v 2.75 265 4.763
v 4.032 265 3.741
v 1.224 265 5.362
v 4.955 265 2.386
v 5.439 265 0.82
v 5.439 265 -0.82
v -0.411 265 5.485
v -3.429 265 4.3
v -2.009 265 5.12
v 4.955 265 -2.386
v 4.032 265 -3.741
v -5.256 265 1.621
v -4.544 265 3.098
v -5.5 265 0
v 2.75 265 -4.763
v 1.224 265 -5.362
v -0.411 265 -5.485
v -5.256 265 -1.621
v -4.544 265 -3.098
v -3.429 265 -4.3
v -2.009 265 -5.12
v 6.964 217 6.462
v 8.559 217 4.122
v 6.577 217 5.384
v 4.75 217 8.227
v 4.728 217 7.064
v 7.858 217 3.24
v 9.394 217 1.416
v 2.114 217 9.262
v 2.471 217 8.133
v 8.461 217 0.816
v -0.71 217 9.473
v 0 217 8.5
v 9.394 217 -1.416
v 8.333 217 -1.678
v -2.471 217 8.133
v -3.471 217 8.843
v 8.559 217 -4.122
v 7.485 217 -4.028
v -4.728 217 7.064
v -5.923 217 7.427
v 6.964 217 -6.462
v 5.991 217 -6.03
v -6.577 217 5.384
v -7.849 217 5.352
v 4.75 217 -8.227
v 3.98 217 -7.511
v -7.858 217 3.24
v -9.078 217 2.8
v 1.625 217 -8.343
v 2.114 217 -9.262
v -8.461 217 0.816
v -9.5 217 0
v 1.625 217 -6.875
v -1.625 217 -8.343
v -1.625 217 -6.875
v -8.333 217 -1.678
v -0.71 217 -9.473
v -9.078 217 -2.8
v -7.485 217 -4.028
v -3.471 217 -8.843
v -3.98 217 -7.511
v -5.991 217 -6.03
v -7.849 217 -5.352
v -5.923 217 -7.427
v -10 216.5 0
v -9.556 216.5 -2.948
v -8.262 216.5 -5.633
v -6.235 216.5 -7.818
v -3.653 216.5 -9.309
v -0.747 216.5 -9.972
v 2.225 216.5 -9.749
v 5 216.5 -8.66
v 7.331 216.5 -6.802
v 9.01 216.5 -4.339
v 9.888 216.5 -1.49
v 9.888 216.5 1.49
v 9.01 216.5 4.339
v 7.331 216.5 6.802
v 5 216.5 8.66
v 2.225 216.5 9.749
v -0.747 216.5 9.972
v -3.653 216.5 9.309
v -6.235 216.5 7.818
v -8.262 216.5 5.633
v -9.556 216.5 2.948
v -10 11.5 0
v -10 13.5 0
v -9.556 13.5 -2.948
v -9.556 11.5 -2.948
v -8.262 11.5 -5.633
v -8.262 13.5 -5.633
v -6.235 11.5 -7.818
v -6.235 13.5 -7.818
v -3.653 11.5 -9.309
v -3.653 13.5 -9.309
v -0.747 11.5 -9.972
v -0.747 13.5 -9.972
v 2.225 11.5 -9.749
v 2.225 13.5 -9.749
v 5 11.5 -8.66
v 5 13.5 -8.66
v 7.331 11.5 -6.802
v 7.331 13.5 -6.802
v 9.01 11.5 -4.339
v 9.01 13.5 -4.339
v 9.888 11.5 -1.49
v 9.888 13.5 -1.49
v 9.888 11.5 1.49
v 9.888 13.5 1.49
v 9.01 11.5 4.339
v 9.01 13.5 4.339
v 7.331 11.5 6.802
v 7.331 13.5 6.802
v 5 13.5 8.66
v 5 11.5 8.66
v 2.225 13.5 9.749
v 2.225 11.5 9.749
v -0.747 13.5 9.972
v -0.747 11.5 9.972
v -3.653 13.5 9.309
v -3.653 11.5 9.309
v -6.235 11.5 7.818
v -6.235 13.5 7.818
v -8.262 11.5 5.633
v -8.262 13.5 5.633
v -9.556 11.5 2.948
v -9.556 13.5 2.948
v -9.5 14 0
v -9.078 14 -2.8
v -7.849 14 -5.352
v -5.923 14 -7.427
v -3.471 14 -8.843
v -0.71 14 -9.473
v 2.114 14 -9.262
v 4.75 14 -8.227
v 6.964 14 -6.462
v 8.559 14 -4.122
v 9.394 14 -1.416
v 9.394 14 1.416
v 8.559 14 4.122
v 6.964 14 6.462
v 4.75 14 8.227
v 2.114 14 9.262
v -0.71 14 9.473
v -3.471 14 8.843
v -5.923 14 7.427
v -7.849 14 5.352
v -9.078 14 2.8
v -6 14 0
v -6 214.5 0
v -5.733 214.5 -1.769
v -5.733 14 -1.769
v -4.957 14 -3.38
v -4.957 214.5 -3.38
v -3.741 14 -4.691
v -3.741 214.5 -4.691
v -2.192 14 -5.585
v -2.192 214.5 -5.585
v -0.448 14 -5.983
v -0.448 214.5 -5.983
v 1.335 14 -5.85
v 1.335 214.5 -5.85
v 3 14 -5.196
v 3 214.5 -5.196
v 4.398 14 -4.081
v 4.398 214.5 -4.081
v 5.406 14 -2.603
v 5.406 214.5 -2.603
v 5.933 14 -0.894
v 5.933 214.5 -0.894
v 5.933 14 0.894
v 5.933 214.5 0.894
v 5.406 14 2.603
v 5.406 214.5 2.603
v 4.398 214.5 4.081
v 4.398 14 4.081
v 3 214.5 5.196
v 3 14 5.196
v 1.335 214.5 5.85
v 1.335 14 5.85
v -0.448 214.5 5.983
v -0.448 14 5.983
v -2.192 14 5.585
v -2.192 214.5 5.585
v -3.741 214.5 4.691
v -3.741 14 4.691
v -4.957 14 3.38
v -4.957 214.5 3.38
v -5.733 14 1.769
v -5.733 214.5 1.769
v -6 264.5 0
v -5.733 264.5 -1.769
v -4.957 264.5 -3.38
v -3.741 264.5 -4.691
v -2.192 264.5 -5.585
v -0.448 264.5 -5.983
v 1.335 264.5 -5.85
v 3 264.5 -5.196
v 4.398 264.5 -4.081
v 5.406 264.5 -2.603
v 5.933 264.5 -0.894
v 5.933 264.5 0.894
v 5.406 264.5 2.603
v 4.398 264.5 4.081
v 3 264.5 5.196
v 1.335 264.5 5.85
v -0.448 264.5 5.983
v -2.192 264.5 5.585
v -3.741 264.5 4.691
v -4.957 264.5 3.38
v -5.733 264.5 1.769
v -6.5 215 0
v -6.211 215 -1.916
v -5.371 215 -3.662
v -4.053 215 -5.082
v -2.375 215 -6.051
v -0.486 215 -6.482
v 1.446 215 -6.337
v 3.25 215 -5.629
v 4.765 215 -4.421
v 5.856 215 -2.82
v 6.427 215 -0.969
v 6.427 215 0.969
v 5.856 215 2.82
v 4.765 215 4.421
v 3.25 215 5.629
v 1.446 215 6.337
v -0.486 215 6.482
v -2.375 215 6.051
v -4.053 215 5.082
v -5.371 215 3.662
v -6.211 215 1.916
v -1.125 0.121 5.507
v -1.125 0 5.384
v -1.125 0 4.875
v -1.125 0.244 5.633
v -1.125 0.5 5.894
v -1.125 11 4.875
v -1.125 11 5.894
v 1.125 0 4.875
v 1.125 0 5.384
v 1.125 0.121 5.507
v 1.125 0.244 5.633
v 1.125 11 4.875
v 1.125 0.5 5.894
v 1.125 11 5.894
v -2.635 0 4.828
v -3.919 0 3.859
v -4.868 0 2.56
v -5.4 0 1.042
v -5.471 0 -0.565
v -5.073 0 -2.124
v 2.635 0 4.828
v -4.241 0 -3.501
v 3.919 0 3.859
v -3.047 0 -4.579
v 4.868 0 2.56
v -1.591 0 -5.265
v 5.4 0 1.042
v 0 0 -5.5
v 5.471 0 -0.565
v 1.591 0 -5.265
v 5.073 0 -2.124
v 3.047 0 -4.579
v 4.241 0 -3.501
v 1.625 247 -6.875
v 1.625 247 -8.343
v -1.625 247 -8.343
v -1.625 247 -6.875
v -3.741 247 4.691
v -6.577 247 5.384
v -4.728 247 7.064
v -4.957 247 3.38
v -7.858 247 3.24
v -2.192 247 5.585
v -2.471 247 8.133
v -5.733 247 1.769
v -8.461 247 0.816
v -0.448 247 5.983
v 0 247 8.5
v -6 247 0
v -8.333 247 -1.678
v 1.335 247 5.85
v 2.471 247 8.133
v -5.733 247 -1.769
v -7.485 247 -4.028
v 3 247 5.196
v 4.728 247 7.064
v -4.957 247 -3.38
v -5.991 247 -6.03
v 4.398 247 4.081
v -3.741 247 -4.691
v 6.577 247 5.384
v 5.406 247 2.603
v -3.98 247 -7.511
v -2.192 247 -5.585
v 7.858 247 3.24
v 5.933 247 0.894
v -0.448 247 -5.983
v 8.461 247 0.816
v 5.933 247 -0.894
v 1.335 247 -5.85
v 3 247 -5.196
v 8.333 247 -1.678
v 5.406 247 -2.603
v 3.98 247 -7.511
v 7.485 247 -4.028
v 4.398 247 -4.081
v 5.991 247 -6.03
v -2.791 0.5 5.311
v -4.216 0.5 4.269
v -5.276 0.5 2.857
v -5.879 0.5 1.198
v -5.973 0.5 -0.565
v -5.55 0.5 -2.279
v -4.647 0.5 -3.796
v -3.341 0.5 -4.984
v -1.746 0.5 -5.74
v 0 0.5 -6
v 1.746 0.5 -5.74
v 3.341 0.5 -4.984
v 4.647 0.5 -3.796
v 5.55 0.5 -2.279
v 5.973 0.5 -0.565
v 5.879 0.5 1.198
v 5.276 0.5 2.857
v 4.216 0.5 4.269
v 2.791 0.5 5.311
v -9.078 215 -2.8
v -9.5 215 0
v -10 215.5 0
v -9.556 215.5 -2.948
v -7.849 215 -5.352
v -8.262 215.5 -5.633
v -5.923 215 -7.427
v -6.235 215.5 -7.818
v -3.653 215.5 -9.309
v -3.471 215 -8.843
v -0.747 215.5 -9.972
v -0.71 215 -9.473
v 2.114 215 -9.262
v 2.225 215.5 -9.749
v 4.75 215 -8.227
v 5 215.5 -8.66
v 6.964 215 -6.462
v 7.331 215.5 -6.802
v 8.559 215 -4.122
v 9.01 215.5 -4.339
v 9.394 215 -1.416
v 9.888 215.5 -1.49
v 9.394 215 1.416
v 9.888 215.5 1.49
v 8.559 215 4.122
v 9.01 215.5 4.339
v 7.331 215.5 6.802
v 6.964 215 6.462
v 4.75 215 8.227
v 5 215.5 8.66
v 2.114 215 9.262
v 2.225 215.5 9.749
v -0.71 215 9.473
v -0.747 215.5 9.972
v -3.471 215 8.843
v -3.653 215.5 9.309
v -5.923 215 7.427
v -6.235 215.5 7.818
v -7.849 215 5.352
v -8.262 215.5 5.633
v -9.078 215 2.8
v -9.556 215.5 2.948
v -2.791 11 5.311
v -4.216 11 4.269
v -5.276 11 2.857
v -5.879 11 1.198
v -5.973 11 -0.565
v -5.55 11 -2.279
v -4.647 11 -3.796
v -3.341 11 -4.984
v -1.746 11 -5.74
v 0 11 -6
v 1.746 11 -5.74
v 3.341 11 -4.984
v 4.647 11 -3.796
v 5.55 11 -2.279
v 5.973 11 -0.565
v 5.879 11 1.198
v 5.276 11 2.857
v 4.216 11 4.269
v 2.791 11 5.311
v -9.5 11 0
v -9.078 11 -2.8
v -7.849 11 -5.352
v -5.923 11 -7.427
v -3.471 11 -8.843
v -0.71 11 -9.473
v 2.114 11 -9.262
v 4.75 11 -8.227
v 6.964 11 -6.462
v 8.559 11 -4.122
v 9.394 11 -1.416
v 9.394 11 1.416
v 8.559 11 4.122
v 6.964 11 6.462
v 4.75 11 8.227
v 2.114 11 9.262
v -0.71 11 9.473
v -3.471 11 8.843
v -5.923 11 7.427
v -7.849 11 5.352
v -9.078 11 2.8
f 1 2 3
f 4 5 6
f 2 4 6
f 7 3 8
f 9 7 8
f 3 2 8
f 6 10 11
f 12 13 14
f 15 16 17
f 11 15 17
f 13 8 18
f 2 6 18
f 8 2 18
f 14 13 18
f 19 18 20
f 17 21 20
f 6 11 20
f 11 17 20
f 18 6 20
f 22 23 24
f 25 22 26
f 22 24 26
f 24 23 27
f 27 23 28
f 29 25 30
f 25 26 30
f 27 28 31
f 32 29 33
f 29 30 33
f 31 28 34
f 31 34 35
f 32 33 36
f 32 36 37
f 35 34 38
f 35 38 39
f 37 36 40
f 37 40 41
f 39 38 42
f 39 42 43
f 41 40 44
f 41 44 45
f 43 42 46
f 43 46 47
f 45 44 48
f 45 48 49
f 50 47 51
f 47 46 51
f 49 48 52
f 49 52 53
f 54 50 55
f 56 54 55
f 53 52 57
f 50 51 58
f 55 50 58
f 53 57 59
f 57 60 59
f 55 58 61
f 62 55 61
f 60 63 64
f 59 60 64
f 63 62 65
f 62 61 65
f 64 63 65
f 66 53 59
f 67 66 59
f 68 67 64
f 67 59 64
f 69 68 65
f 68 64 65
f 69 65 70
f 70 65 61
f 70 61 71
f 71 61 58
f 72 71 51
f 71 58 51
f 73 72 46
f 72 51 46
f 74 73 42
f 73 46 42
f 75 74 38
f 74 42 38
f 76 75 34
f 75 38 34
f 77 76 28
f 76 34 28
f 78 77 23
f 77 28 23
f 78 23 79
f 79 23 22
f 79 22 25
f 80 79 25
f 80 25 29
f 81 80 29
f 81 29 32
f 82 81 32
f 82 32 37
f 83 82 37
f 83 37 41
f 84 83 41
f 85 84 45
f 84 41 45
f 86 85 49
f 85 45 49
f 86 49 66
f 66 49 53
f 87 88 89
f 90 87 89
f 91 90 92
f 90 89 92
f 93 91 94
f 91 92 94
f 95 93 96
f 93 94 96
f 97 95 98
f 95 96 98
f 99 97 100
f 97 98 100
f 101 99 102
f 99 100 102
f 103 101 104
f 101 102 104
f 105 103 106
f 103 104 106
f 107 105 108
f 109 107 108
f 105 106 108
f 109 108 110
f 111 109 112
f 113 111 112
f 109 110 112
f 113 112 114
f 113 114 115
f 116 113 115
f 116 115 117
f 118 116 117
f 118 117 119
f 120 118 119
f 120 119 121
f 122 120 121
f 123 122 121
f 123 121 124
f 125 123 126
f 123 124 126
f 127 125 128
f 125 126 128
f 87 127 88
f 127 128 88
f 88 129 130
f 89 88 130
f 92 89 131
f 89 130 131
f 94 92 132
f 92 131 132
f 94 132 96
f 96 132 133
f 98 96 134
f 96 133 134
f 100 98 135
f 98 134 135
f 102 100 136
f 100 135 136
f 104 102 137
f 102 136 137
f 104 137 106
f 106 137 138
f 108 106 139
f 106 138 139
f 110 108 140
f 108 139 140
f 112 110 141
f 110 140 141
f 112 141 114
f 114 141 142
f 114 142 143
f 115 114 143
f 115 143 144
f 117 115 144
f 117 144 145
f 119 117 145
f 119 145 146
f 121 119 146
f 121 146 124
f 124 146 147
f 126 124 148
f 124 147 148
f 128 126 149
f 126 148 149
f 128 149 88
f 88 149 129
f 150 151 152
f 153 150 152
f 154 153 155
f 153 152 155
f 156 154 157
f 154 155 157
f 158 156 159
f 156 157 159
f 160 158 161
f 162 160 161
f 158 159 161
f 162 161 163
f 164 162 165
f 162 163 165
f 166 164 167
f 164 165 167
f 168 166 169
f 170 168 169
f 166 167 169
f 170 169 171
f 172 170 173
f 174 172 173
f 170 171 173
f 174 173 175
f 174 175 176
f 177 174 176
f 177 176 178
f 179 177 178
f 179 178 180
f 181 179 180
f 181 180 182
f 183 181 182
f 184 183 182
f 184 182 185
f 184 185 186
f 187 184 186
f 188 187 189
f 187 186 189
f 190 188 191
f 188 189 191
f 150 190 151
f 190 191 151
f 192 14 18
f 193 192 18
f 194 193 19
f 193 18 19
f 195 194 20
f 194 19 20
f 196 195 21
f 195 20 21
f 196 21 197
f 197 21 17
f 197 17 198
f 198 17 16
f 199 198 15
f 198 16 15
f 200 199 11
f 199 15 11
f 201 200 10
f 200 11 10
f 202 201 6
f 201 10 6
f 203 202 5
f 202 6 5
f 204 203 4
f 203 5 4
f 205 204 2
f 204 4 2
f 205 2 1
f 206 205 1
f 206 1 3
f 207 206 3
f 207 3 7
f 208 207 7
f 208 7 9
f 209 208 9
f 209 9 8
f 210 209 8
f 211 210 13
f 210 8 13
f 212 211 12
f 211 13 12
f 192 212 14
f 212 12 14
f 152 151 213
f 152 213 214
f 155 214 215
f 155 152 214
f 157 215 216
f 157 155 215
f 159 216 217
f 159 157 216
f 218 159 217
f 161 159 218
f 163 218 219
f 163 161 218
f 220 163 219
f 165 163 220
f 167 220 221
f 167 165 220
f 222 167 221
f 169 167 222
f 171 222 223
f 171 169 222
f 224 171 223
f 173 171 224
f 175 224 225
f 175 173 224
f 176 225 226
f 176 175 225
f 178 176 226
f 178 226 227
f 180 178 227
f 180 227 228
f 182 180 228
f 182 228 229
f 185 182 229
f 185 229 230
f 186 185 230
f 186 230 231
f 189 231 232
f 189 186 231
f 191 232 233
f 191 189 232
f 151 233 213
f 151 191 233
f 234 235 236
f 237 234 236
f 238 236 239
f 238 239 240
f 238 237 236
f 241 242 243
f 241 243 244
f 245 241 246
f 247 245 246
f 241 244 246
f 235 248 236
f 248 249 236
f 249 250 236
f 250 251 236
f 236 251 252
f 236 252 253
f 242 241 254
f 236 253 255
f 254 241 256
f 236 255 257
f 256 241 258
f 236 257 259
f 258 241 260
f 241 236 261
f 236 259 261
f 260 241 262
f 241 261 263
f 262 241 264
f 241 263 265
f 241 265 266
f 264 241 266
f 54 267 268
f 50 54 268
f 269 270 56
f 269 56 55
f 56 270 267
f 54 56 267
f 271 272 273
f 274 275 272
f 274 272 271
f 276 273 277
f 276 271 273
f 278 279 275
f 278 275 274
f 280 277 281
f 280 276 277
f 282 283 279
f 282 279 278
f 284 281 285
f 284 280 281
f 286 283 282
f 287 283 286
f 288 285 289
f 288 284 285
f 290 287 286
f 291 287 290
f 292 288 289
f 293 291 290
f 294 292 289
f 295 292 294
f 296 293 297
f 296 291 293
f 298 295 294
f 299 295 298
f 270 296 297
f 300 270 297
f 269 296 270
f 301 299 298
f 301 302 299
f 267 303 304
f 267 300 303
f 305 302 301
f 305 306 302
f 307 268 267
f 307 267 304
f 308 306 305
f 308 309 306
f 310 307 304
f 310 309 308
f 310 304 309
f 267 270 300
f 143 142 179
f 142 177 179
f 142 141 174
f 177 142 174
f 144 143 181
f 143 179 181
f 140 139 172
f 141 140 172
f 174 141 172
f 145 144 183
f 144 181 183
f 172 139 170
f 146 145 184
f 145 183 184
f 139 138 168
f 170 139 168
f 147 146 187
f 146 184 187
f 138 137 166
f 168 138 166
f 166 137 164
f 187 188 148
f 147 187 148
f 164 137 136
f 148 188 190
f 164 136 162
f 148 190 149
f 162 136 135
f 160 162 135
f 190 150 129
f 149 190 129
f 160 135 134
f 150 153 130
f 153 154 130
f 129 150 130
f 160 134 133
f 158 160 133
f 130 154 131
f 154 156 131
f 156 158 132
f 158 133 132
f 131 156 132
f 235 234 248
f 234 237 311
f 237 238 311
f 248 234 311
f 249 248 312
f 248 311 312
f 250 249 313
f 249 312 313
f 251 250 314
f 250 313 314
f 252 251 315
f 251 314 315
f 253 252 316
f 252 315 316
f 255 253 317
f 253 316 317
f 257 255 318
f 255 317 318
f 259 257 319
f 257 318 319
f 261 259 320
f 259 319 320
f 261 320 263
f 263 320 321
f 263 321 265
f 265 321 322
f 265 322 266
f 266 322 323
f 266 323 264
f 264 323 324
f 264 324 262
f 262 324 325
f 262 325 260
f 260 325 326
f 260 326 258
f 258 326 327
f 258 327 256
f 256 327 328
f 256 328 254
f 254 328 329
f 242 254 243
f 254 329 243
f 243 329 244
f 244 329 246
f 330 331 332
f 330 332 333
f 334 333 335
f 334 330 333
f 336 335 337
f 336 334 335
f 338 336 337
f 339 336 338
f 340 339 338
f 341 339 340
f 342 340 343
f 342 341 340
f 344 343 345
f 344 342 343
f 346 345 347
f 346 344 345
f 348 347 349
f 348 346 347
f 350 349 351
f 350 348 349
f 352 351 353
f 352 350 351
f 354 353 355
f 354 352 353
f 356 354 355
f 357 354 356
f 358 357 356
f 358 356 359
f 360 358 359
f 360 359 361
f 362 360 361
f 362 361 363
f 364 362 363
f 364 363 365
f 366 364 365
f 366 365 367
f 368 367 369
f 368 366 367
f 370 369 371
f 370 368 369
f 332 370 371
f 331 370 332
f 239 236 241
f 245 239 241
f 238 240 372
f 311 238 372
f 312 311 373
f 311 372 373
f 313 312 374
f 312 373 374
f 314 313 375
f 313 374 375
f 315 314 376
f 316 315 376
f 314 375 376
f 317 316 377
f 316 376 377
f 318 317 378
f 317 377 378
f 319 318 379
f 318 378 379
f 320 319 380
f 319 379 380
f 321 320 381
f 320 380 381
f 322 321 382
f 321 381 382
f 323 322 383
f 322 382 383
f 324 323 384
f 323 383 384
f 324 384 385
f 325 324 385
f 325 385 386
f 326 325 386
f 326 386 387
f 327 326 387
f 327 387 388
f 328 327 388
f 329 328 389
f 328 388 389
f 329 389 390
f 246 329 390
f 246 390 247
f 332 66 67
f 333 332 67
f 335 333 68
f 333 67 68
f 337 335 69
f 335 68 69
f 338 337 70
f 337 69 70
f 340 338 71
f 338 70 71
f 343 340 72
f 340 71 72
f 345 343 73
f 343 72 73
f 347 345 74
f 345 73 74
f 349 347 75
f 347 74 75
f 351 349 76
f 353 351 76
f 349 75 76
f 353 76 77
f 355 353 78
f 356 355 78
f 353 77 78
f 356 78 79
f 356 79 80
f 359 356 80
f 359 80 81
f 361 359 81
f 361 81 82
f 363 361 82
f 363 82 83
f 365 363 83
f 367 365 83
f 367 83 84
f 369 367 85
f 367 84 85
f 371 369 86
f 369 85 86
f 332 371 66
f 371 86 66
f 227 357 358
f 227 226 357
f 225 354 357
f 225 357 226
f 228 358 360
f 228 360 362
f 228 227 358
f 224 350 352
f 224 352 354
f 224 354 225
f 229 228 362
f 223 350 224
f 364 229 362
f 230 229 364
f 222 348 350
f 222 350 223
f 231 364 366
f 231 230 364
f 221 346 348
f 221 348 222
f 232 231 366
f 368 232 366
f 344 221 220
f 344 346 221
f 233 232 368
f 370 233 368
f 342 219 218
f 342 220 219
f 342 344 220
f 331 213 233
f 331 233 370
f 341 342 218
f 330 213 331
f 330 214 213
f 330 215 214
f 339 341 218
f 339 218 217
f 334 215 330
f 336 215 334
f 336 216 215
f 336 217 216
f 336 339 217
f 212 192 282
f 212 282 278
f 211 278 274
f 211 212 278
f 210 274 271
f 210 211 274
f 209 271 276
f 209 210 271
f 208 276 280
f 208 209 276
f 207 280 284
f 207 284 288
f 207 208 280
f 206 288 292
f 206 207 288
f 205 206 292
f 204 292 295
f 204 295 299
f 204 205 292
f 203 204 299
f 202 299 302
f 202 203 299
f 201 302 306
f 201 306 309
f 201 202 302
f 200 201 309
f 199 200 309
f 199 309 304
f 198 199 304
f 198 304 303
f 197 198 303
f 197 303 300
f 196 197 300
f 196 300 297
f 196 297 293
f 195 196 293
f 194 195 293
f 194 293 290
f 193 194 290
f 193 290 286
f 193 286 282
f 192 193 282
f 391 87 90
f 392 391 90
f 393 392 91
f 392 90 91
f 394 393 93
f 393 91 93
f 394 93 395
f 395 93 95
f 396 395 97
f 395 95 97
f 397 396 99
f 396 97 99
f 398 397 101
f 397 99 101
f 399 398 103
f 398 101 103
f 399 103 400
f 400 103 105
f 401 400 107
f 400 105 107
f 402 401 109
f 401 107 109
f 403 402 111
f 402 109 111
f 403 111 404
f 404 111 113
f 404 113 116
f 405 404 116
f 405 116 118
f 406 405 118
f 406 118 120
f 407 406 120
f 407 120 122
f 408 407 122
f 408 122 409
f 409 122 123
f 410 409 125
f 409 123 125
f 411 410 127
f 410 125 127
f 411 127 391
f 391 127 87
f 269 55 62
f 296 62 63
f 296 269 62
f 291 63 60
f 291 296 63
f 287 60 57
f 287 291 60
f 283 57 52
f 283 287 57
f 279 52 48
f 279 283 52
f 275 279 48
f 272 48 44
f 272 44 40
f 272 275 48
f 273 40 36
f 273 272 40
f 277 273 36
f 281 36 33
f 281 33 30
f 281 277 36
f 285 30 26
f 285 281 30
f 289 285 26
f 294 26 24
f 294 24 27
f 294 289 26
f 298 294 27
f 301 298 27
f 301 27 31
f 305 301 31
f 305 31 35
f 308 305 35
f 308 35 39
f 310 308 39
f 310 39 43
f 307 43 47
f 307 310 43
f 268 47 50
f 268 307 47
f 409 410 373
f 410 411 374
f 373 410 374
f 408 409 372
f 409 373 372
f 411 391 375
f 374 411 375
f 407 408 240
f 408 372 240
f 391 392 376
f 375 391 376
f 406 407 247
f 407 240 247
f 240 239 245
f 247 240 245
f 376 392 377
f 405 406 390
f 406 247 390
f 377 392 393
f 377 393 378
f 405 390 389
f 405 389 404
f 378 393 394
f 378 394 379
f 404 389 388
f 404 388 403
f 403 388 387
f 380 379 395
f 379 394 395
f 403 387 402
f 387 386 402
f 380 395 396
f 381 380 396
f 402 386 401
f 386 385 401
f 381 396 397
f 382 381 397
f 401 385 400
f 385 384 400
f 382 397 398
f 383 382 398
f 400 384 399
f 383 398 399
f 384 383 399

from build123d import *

# Parameters (mm, degrees)
SKETCH3_W           = 2.25
SKETCH3_H           = 2.25
CUT_EXTRUDE1_DEPTH  = 11
CHAMFER1_SIZE       = 0.5
SKETCH4_R           = 8.5
SKETCH4_R_2         = 6
BOSS_EXTRUDE1_DEPTH = 48
SKETCH5_OUTSIDE_W   = 75.302
SKETCH5_OUTSIDE_H   = 75.302
SKETCH5_OUTSIDE_R   = 6
CUT_EXTRUDE2_DEPTH  = 18
SKETCH6_W           = 3.25
SKETCH6_H           = 3.25
CUT_EXTRUDE3_DEPTH  = 30
SKETCH7_R           = 10
SKETCH7_R_2         = 6
BOSS_EXTRUDE2_DEPTH = 2
CHAMFER2_SIZE       = 0.5


with BuildPart() as part:
    # Sketch2 → Revolve1 (revolve)
    with BuildSketch(Plane.XY, mode=Mode.PRIVATE) as revolve1_sk:
        Polygon((0, 0), (6, 0), (6, 11), (10, 11), (10, 14), (6, 14), (6, 265), (0, 265), align=None)
    revolve(revolve1_sk.sketch.rotate(Axis((0, 265, 0), (0, -1, 0)), 180), axis=Axis((0, 265, 0), (0, -1, 0)))

    # Sketch3 → Cut-Extrude1 (cut)
    with BuildSketch(Plane.XZ):
        with Locations((0, 6)):
            Rectangle(SKETCH3_W, SKETCH3_H)
    extrude(amount=-CUT_EXTRUDE1_DEPTH, mode=Mode.SUBTRACT)

    # Chamfer1
    chamfer1_edges = [part.edges().sort_by_distance(p)[0] for p in [
        (0, 0, -6),
        (6, 265, 0),
        (10, 14, 0),
        (10, 11, 0),
    ]]
    chamfer(chamfer1_edges, length=CHAMFER1_SIZE)

    # Sketch4 → Boss-Extrude1 (add)
    with BuildSketch(Plane(origin=(0, 265, 0), x_dir=(1, 0, 0), z_dir=(0, 1, 0))):
        with Locations(Location((0, 0, 0), (0, 0, 180))):
            Circle(SKETCH4_R)
        with Locations(Location((0, 0, 0), (0, 0, 180))):
            Circle(SKETCH4_R_2, mode=Mode.SUBTRACT)
    extrude(amount=-BOSS_EXTRUDE1_DEPTH)

    # Sketch5 outside → Cut-Extrude2 (cut)
    with BuildSketch(Plane(origin=(0, 265, 0), x_dir=(1, 0, 0), z_dir=(0, 1, 0))):
        Rectangle(SKETCH5_OUTSIDE_W, SKETCH5_OUTSIDE_H)
        with Locations(Location((0, 0, 0), (0, 0, 180))):
            Circle(SKETCH5_OUTSIDE_R, mode=Mode.SUBTRACT)
    extrude(amount=-CUT_EXTRUDE2_DEPTH, mode=Mode.SUBTRACT)

    # Sketch6 → Cut-Extrude3 (cut)
    with BuildSketch(Plane(origin=(0, 247, 0), x_dir=(1, 0, 0), z_dir=(0, 1, 0))):
        with Locations((0, 8.5)):
            Rectangle(SKETCH6_W, SKETCH6_H)
    extrude(amount=-CUT_EXTRUDE3_DEPTH, mode=Mode.SUBTRACT)

    # Sketch7 → Boss-Extrude2 (add)
    with BuildSketch(Plane.XZ.offset(-217)):
        with Locations(Location((0, 0, 0), (0, 0, 180))):
            Circle(SKETCH7_R)
        with Locations(Location((0, 0, 0), (0, 0, 180))):
            Circle(SKETCH7_R_2, mode=Mode.SUBTRACT)
    extrude(amount=BOSS_EXTRUDE2_DEPTH)

    # Chamfer2
    chamfer2_edges = [part.edges().sort_by_distance(p)[0] for p in [
        (10, 215, 0),
        (10, 217, 0),
        (6, 215, 0),
    ]]
    chamfer(chamfer2_edges, length=CHAMFER2_SIZE)


solid = part.part
